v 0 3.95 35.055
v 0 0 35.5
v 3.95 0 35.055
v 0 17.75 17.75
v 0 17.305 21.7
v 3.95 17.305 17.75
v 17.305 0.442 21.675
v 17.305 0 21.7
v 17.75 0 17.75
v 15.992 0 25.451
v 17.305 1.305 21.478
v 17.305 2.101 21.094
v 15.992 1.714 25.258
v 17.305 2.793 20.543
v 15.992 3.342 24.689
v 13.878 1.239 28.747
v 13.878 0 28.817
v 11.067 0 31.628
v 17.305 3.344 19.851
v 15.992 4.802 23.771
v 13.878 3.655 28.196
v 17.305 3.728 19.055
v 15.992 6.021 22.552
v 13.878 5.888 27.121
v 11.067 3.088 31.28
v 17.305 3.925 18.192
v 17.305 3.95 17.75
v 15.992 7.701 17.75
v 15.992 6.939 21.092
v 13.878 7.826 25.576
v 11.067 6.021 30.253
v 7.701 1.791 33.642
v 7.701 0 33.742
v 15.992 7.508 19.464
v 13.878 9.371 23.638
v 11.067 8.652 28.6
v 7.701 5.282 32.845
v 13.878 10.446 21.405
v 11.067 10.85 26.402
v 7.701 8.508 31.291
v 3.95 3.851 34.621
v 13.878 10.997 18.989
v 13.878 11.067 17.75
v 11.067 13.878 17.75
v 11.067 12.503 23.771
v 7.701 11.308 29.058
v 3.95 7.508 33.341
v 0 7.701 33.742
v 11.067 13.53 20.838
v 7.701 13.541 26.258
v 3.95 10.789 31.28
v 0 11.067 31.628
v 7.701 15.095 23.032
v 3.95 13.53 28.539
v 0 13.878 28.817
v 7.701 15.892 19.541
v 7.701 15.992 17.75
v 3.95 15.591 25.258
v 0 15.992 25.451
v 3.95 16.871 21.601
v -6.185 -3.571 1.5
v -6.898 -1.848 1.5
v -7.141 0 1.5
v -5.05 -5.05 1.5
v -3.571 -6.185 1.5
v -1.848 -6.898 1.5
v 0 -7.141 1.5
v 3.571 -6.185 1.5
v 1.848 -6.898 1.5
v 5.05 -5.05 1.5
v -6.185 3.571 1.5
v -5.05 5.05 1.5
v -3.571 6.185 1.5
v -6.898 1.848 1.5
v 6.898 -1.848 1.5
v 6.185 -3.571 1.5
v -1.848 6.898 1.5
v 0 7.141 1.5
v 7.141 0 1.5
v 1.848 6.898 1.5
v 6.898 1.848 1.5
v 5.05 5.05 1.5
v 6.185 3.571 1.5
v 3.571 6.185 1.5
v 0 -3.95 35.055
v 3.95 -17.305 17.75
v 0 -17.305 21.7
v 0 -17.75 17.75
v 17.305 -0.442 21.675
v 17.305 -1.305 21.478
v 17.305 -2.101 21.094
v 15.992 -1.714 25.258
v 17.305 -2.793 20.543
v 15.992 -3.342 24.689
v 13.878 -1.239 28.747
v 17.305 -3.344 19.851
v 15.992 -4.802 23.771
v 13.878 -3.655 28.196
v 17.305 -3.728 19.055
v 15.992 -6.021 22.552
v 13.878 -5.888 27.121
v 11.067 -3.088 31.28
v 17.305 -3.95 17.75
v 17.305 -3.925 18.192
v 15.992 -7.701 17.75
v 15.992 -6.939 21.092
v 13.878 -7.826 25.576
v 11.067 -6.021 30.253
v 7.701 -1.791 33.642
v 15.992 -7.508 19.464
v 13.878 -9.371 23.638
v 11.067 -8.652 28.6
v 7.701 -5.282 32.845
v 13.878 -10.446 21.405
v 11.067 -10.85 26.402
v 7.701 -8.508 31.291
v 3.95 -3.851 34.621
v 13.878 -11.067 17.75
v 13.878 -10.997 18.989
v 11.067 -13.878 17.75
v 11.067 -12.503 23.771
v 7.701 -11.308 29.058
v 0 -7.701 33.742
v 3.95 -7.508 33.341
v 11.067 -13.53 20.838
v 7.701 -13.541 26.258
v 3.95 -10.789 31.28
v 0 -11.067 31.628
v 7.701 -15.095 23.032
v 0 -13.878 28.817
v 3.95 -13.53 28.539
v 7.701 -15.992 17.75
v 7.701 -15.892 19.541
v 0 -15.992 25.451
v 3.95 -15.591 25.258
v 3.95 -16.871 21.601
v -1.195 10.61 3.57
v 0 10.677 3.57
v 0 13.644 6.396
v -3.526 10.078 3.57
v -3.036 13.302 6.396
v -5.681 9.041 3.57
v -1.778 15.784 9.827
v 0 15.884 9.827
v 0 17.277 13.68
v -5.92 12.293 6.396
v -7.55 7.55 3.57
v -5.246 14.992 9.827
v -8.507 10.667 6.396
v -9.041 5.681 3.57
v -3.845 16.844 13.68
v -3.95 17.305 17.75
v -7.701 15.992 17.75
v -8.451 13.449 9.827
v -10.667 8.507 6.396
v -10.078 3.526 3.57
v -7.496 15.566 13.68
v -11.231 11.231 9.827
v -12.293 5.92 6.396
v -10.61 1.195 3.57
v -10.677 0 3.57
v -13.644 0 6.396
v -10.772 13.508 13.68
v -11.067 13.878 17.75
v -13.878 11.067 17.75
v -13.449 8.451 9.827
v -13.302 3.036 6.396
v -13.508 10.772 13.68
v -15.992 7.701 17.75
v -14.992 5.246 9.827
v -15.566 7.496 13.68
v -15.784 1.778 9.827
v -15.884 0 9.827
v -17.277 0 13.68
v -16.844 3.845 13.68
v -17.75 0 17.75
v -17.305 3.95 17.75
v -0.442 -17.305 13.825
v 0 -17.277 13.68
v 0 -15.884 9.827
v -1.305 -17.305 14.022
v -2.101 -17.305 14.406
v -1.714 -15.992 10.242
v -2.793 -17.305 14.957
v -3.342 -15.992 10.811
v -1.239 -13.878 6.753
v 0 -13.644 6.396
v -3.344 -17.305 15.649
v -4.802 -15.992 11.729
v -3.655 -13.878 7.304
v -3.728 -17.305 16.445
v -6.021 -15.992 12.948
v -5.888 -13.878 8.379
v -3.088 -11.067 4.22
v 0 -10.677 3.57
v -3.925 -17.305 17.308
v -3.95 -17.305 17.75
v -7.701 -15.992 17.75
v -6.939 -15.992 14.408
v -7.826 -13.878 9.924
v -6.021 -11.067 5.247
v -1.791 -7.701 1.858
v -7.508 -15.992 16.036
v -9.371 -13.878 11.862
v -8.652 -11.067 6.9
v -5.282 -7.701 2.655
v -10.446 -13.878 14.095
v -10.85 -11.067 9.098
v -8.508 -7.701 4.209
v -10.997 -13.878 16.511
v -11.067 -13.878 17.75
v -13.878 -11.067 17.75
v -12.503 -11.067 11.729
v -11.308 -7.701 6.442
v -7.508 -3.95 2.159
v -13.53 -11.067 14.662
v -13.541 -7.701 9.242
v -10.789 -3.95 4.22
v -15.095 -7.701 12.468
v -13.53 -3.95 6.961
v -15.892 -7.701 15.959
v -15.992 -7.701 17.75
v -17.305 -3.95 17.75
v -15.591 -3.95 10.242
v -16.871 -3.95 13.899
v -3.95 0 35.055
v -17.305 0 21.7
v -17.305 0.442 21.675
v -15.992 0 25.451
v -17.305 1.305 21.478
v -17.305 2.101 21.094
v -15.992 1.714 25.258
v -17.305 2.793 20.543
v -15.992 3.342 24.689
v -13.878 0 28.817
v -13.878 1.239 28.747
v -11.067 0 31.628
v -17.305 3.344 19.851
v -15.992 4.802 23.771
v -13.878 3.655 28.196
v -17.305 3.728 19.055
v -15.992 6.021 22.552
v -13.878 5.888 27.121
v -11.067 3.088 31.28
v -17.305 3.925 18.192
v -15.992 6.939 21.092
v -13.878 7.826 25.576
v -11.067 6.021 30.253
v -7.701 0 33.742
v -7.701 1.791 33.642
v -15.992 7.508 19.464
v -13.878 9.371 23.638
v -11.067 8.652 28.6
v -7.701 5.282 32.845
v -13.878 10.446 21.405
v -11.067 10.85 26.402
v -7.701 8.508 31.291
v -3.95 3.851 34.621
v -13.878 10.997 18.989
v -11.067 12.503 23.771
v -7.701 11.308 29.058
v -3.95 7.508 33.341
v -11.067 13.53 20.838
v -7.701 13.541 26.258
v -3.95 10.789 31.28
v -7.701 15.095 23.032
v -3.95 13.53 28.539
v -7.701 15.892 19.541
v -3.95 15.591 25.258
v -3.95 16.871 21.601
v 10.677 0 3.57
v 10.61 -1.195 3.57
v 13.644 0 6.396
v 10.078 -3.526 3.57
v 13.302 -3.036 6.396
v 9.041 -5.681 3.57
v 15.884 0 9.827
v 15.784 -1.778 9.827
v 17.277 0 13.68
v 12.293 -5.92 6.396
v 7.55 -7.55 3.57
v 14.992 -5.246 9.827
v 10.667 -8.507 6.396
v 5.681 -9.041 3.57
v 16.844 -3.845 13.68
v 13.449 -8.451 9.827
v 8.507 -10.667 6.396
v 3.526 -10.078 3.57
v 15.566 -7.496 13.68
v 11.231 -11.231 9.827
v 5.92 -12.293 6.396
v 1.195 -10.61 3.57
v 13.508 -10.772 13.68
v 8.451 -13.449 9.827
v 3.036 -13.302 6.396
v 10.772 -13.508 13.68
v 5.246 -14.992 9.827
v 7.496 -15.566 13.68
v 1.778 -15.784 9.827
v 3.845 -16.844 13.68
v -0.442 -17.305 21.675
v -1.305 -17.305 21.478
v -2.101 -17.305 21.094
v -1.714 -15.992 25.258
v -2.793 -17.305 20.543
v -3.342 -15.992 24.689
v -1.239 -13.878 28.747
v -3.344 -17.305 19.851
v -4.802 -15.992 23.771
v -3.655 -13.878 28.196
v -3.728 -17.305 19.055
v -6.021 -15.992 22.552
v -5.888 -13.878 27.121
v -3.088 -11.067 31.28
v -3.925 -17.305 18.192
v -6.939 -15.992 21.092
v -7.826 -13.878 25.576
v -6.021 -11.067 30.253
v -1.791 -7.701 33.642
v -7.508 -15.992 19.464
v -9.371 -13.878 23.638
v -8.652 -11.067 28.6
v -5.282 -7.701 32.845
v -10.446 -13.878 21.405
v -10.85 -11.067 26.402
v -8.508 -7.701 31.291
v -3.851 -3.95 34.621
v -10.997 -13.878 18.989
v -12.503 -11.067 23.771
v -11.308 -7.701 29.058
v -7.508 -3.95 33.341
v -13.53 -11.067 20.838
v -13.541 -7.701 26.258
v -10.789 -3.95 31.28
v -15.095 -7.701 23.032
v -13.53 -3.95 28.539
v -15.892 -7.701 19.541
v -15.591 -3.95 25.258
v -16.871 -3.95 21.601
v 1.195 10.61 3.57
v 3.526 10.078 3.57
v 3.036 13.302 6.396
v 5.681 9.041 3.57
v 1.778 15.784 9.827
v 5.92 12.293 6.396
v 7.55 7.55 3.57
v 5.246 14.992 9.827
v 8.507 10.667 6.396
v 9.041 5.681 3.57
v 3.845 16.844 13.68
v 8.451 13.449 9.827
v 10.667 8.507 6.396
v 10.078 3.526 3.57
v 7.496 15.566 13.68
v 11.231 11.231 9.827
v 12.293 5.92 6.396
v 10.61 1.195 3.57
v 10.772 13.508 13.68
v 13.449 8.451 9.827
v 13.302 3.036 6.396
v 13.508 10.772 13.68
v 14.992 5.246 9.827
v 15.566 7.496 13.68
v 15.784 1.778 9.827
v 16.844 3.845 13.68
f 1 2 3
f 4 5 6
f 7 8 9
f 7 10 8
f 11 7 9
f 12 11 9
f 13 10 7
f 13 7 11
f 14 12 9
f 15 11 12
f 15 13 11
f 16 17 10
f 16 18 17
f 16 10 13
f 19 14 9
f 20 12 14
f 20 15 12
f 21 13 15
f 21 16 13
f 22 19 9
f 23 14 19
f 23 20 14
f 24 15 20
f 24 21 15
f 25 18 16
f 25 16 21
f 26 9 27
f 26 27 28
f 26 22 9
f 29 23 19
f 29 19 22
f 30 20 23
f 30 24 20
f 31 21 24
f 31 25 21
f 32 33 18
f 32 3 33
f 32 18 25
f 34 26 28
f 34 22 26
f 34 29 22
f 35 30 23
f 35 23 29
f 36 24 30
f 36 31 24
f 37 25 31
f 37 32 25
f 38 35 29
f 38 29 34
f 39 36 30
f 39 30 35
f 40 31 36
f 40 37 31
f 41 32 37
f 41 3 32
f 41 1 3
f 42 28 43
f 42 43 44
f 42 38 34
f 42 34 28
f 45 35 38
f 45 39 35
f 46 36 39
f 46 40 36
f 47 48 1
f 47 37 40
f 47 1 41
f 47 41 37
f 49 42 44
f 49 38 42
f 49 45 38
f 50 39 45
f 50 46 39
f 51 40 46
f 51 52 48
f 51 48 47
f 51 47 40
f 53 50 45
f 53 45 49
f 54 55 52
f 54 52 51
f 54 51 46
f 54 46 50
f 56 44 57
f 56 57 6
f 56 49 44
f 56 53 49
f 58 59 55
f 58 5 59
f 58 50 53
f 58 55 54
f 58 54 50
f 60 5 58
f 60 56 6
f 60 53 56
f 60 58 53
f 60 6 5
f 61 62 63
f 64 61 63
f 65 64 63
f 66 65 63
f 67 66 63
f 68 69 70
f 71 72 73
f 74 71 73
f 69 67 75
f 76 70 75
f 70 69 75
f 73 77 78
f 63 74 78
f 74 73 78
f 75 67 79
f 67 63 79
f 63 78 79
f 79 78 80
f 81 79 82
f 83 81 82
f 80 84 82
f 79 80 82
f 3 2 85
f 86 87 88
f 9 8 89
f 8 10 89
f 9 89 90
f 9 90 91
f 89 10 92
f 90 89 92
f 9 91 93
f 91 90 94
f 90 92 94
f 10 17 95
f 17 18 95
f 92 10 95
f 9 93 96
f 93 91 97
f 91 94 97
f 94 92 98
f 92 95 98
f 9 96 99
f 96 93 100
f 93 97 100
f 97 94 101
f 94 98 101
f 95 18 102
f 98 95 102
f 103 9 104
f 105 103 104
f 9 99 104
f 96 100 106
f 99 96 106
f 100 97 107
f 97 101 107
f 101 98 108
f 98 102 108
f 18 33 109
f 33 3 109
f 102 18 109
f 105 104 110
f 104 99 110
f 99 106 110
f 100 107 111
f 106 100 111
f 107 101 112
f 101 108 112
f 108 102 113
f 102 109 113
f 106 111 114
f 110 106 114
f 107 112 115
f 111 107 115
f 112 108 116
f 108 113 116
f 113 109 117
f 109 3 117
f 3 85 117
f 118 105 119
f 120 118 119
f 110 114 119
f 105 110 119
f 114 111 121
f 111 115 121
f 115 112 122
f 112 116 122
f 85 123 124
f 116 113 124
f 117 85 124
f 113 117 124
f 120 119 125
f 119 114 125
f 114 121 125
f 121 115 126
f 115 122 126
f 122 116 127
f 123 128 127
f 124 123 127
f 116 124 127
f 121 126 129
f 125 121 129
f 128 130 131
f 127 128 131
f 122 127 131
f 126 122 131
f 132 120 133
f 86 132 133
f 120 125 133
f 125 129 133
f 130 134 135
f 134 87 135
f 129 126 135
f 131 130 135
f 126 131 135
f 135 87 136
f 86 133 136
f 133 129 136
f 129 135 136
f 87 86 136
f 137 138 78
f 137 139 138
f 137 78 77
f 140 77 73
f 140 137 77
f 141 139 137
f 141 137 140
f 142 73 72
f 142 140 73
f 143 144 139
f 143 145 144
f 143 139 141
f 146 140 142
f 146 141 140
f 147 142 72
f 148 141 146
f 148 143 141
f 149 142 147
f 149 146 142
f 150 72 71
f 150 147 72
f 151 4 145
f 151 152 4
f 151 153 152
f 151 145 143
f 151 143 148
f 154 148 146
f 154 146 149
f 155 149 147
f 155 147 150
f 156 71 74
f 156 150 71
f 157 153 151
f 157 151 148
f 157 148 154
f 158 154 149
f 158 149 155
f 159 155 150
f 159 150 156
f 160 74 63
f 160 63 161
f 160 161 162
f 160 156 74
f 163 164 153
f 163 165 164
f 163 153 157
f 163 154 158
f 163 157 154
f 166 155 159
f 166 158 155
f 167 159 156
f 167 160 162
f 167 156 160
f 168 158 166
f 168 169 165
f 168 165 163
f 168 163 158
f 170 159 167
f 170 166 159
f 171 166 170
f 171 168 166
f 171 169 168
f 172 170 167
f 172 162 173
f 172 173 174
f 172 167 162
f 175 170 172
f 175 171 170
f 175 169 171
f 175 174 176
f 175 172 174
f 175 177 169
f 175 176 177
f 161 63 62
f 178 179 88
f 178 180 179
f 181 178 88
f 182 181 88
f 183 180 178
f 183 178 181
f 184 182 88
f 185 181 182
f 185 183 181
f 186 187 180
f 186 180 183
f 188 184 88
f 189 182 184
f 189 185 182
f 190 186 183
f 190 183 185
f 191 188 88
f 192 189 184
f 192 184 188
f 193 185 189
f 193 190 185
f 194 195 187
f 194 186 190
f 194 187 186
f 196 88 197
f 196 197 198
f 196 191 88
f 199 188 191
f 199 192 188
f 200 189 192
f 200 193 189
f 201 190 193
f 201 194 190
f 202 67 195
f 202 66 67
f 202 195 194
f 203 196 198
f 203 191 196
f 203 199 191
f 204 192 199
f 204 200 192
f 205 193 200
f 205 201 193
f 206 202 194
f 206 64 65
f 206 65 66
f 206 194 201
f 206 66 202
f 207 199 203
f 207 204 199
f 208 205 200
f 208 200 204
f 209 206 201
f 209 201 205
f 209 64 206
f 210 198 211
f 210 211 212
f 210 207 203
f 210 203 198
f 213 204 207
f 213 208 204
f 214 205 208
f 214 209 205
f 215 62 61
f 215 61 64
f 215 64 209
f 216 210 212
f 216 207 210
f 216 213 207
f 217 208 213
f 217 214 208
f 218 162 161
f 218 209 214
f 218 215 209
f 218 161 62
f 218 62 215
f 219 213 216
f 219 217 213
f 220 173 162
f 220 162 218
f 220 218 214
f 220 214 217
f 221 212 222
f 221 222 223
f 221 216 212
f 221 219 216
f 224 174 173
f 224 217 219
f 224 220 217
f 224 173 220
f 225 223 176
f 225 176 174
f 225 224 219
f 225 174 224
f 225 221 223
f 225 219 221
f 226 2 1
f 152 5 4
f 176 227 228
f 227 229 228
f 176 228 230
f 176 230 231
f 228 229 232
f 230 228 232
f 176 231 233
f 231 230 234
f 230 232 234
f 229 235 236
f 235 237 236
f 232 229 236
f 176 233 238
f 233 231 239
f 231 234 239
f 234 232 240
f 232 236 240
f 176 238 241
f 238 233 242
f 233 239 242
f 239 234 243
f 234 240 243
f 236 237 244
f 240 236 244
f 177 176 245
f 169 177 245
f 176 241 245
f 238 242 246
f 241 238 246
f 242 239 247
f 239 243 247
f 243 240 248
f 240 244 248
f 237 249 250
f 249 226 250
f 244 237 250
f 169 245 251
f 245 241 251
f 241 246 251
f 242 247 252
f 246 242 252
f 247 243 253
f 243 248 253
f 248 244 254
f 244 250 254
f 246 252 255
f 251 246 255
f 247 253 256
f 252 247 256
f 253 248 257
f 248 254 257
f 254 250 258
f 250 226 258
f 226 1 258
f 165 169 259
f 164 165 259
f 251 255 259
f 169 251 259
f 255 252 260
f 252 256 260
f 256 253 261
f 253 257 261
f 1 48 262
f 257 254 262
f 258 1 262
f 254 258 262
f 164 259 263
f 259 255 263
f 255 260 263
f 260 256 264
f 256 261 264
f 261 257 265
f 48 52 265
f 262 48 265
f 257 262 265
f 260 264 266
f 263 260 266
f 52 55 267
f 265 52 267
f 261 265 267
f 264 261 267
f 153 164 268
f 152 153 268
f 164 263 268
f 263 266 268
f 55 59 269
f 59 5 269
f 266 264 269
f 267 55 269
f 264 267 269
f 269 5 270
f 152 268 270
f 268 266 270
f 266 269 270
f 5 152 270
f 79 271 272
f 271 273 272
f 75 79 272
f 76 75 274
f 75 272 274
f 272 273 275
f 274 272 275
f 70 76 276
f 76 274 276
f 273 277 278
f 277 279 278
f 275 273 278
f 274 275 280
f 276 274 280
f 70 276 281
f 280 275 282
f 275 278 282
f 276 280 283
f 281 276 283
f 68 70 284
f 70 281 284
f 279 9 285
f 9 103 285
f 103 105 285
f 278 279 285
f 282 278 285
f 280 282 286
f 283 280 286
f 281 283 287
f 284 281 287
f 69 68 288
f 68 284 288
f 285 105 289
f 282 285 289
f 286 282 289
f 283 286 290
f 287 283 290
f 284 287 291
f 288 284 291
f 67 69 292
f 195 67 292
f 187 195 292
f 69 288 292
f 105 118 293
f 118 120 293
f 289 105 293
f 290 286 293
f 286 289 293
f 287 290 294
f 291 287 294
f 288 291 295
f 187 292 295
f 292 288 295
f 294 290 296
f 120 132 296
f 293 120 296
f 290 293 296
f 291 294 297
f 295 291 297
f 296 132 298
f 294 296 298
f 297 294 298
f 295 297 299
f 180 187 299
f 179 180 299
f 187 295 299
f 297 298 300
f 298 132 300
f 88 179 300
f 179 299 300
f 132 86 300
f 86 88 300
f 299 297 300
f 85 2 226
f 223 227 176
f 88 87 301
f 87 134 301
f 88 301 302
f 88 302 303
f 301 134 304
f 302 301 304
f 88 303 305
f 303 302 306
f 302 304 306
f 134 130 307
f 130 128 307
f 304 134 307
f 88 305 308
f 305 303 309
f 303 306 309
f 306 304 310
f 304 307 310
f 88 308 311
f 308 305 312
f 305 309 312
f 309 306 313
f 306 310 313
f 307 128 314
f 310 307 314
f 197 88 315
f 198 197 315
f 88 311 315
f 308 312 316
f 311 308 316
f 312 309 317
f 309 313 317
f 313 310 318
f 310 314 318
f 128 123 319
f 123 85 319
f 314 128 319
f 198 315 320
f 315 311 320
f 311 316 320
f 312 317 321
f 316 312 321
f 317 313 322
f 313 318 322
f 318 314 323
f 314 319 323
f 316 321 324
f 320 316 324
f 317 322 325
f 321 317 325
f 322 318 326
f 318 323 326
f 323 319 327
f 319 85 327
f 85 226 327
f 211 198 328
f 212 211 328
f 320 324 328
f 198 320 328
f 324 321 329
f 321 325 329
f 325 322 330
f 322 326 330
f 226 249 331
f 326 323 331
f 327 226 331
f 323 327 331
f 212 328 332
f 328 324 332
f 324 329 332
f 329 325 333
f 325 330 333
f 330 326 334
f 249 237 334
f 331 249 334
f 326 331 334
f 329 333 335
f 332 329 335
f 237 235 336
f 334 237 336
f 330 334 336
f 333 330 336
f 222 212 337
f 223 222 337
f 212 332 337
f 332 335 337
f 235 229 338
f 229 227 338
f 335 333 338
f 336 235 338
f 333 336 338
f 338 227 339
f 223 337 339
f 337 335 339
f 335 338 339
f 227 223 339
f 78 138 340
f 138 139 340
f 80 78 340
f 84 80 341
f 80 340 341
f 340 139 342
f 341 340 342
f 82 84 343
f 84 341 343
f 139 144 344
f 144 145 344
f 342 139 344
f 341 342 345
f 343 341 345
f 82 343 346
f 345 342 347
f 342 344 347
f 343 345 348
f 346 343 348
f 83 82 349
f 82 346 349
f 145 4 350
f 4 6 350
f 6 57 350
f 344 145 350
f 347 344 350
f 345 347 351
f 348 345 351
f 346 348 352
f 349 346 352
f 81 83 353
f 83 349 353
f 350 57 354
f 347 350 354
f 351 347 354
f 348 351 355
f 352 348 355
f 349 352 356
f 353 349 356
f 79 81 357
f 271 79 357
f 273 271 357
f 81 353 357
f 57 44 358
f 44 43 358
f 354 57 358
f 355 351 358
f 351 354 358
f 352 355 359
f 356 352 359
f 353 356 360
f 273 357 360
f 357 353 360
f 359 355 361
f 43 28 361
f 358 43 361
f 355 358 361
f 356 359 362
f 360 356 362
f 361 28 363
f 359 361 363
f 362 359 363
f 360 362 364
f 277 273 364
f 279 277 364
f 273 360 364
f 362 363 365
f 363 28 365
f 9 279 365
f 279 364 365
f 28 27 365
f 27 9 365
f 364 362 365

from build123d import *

# Parameters (mm, degrees)
F0_W     = 35.5
F0_H     = 35.5
F1_DEPTH = 35.5
F2_R     = 17.74999
F3_DEPTH = 1.5


# Not quite as in the source:
# - a fillet or chamfer is up to 0.001 mm smaller than in the source, because OpenCascade refuses the exact size


with BuildPart() as f1:
    # F0 (on Top) → F1 (new body)
    with BuildSketch(Plane.XY):
        Rectangle(F0_W, F0_H)
    extrude(amount=F1_DEPTH)

    # F2 (radius 17.75 in the source; OpenCascade refuses exactly that, so slightly less here)
    f2_edges = [f1.edges().sort_by_distance(p)[0] for p in [
        (0, 17.75, 35.5),
        (-17.75, 0, 35.5),
        (0, -17.75, 35.5),
        (17.75, 0, 35.5),
        (17.75, 17.75, 17.75),
        (-17.75, 17.75, 17.75),
        (0, 17.75, 0),
        (17.75, -17.75, 17.75),
        (17.75, 0, 0),
        (-17.75, 0, 0),
        (0, -17.75, 0),
        (-17.75, -17.75, 17.75),
    ]]
    fillet(f2_edges, radius=F2_R)


with BuildPart() as f3:
    # F0 (on Top) → F3 (new body, symmetric)
    with BuildSketch(Plane.XY):
        Rectangle(F0_W, F0_H)
    extrude(amount=F3_DEPTH, both=True)


with BuildPart() as f1_1:
    add(f1.part)

    # F4: cut F3
    add(f3.part, mode=Mode.SUBTRACT)


solid = f1_1.part
